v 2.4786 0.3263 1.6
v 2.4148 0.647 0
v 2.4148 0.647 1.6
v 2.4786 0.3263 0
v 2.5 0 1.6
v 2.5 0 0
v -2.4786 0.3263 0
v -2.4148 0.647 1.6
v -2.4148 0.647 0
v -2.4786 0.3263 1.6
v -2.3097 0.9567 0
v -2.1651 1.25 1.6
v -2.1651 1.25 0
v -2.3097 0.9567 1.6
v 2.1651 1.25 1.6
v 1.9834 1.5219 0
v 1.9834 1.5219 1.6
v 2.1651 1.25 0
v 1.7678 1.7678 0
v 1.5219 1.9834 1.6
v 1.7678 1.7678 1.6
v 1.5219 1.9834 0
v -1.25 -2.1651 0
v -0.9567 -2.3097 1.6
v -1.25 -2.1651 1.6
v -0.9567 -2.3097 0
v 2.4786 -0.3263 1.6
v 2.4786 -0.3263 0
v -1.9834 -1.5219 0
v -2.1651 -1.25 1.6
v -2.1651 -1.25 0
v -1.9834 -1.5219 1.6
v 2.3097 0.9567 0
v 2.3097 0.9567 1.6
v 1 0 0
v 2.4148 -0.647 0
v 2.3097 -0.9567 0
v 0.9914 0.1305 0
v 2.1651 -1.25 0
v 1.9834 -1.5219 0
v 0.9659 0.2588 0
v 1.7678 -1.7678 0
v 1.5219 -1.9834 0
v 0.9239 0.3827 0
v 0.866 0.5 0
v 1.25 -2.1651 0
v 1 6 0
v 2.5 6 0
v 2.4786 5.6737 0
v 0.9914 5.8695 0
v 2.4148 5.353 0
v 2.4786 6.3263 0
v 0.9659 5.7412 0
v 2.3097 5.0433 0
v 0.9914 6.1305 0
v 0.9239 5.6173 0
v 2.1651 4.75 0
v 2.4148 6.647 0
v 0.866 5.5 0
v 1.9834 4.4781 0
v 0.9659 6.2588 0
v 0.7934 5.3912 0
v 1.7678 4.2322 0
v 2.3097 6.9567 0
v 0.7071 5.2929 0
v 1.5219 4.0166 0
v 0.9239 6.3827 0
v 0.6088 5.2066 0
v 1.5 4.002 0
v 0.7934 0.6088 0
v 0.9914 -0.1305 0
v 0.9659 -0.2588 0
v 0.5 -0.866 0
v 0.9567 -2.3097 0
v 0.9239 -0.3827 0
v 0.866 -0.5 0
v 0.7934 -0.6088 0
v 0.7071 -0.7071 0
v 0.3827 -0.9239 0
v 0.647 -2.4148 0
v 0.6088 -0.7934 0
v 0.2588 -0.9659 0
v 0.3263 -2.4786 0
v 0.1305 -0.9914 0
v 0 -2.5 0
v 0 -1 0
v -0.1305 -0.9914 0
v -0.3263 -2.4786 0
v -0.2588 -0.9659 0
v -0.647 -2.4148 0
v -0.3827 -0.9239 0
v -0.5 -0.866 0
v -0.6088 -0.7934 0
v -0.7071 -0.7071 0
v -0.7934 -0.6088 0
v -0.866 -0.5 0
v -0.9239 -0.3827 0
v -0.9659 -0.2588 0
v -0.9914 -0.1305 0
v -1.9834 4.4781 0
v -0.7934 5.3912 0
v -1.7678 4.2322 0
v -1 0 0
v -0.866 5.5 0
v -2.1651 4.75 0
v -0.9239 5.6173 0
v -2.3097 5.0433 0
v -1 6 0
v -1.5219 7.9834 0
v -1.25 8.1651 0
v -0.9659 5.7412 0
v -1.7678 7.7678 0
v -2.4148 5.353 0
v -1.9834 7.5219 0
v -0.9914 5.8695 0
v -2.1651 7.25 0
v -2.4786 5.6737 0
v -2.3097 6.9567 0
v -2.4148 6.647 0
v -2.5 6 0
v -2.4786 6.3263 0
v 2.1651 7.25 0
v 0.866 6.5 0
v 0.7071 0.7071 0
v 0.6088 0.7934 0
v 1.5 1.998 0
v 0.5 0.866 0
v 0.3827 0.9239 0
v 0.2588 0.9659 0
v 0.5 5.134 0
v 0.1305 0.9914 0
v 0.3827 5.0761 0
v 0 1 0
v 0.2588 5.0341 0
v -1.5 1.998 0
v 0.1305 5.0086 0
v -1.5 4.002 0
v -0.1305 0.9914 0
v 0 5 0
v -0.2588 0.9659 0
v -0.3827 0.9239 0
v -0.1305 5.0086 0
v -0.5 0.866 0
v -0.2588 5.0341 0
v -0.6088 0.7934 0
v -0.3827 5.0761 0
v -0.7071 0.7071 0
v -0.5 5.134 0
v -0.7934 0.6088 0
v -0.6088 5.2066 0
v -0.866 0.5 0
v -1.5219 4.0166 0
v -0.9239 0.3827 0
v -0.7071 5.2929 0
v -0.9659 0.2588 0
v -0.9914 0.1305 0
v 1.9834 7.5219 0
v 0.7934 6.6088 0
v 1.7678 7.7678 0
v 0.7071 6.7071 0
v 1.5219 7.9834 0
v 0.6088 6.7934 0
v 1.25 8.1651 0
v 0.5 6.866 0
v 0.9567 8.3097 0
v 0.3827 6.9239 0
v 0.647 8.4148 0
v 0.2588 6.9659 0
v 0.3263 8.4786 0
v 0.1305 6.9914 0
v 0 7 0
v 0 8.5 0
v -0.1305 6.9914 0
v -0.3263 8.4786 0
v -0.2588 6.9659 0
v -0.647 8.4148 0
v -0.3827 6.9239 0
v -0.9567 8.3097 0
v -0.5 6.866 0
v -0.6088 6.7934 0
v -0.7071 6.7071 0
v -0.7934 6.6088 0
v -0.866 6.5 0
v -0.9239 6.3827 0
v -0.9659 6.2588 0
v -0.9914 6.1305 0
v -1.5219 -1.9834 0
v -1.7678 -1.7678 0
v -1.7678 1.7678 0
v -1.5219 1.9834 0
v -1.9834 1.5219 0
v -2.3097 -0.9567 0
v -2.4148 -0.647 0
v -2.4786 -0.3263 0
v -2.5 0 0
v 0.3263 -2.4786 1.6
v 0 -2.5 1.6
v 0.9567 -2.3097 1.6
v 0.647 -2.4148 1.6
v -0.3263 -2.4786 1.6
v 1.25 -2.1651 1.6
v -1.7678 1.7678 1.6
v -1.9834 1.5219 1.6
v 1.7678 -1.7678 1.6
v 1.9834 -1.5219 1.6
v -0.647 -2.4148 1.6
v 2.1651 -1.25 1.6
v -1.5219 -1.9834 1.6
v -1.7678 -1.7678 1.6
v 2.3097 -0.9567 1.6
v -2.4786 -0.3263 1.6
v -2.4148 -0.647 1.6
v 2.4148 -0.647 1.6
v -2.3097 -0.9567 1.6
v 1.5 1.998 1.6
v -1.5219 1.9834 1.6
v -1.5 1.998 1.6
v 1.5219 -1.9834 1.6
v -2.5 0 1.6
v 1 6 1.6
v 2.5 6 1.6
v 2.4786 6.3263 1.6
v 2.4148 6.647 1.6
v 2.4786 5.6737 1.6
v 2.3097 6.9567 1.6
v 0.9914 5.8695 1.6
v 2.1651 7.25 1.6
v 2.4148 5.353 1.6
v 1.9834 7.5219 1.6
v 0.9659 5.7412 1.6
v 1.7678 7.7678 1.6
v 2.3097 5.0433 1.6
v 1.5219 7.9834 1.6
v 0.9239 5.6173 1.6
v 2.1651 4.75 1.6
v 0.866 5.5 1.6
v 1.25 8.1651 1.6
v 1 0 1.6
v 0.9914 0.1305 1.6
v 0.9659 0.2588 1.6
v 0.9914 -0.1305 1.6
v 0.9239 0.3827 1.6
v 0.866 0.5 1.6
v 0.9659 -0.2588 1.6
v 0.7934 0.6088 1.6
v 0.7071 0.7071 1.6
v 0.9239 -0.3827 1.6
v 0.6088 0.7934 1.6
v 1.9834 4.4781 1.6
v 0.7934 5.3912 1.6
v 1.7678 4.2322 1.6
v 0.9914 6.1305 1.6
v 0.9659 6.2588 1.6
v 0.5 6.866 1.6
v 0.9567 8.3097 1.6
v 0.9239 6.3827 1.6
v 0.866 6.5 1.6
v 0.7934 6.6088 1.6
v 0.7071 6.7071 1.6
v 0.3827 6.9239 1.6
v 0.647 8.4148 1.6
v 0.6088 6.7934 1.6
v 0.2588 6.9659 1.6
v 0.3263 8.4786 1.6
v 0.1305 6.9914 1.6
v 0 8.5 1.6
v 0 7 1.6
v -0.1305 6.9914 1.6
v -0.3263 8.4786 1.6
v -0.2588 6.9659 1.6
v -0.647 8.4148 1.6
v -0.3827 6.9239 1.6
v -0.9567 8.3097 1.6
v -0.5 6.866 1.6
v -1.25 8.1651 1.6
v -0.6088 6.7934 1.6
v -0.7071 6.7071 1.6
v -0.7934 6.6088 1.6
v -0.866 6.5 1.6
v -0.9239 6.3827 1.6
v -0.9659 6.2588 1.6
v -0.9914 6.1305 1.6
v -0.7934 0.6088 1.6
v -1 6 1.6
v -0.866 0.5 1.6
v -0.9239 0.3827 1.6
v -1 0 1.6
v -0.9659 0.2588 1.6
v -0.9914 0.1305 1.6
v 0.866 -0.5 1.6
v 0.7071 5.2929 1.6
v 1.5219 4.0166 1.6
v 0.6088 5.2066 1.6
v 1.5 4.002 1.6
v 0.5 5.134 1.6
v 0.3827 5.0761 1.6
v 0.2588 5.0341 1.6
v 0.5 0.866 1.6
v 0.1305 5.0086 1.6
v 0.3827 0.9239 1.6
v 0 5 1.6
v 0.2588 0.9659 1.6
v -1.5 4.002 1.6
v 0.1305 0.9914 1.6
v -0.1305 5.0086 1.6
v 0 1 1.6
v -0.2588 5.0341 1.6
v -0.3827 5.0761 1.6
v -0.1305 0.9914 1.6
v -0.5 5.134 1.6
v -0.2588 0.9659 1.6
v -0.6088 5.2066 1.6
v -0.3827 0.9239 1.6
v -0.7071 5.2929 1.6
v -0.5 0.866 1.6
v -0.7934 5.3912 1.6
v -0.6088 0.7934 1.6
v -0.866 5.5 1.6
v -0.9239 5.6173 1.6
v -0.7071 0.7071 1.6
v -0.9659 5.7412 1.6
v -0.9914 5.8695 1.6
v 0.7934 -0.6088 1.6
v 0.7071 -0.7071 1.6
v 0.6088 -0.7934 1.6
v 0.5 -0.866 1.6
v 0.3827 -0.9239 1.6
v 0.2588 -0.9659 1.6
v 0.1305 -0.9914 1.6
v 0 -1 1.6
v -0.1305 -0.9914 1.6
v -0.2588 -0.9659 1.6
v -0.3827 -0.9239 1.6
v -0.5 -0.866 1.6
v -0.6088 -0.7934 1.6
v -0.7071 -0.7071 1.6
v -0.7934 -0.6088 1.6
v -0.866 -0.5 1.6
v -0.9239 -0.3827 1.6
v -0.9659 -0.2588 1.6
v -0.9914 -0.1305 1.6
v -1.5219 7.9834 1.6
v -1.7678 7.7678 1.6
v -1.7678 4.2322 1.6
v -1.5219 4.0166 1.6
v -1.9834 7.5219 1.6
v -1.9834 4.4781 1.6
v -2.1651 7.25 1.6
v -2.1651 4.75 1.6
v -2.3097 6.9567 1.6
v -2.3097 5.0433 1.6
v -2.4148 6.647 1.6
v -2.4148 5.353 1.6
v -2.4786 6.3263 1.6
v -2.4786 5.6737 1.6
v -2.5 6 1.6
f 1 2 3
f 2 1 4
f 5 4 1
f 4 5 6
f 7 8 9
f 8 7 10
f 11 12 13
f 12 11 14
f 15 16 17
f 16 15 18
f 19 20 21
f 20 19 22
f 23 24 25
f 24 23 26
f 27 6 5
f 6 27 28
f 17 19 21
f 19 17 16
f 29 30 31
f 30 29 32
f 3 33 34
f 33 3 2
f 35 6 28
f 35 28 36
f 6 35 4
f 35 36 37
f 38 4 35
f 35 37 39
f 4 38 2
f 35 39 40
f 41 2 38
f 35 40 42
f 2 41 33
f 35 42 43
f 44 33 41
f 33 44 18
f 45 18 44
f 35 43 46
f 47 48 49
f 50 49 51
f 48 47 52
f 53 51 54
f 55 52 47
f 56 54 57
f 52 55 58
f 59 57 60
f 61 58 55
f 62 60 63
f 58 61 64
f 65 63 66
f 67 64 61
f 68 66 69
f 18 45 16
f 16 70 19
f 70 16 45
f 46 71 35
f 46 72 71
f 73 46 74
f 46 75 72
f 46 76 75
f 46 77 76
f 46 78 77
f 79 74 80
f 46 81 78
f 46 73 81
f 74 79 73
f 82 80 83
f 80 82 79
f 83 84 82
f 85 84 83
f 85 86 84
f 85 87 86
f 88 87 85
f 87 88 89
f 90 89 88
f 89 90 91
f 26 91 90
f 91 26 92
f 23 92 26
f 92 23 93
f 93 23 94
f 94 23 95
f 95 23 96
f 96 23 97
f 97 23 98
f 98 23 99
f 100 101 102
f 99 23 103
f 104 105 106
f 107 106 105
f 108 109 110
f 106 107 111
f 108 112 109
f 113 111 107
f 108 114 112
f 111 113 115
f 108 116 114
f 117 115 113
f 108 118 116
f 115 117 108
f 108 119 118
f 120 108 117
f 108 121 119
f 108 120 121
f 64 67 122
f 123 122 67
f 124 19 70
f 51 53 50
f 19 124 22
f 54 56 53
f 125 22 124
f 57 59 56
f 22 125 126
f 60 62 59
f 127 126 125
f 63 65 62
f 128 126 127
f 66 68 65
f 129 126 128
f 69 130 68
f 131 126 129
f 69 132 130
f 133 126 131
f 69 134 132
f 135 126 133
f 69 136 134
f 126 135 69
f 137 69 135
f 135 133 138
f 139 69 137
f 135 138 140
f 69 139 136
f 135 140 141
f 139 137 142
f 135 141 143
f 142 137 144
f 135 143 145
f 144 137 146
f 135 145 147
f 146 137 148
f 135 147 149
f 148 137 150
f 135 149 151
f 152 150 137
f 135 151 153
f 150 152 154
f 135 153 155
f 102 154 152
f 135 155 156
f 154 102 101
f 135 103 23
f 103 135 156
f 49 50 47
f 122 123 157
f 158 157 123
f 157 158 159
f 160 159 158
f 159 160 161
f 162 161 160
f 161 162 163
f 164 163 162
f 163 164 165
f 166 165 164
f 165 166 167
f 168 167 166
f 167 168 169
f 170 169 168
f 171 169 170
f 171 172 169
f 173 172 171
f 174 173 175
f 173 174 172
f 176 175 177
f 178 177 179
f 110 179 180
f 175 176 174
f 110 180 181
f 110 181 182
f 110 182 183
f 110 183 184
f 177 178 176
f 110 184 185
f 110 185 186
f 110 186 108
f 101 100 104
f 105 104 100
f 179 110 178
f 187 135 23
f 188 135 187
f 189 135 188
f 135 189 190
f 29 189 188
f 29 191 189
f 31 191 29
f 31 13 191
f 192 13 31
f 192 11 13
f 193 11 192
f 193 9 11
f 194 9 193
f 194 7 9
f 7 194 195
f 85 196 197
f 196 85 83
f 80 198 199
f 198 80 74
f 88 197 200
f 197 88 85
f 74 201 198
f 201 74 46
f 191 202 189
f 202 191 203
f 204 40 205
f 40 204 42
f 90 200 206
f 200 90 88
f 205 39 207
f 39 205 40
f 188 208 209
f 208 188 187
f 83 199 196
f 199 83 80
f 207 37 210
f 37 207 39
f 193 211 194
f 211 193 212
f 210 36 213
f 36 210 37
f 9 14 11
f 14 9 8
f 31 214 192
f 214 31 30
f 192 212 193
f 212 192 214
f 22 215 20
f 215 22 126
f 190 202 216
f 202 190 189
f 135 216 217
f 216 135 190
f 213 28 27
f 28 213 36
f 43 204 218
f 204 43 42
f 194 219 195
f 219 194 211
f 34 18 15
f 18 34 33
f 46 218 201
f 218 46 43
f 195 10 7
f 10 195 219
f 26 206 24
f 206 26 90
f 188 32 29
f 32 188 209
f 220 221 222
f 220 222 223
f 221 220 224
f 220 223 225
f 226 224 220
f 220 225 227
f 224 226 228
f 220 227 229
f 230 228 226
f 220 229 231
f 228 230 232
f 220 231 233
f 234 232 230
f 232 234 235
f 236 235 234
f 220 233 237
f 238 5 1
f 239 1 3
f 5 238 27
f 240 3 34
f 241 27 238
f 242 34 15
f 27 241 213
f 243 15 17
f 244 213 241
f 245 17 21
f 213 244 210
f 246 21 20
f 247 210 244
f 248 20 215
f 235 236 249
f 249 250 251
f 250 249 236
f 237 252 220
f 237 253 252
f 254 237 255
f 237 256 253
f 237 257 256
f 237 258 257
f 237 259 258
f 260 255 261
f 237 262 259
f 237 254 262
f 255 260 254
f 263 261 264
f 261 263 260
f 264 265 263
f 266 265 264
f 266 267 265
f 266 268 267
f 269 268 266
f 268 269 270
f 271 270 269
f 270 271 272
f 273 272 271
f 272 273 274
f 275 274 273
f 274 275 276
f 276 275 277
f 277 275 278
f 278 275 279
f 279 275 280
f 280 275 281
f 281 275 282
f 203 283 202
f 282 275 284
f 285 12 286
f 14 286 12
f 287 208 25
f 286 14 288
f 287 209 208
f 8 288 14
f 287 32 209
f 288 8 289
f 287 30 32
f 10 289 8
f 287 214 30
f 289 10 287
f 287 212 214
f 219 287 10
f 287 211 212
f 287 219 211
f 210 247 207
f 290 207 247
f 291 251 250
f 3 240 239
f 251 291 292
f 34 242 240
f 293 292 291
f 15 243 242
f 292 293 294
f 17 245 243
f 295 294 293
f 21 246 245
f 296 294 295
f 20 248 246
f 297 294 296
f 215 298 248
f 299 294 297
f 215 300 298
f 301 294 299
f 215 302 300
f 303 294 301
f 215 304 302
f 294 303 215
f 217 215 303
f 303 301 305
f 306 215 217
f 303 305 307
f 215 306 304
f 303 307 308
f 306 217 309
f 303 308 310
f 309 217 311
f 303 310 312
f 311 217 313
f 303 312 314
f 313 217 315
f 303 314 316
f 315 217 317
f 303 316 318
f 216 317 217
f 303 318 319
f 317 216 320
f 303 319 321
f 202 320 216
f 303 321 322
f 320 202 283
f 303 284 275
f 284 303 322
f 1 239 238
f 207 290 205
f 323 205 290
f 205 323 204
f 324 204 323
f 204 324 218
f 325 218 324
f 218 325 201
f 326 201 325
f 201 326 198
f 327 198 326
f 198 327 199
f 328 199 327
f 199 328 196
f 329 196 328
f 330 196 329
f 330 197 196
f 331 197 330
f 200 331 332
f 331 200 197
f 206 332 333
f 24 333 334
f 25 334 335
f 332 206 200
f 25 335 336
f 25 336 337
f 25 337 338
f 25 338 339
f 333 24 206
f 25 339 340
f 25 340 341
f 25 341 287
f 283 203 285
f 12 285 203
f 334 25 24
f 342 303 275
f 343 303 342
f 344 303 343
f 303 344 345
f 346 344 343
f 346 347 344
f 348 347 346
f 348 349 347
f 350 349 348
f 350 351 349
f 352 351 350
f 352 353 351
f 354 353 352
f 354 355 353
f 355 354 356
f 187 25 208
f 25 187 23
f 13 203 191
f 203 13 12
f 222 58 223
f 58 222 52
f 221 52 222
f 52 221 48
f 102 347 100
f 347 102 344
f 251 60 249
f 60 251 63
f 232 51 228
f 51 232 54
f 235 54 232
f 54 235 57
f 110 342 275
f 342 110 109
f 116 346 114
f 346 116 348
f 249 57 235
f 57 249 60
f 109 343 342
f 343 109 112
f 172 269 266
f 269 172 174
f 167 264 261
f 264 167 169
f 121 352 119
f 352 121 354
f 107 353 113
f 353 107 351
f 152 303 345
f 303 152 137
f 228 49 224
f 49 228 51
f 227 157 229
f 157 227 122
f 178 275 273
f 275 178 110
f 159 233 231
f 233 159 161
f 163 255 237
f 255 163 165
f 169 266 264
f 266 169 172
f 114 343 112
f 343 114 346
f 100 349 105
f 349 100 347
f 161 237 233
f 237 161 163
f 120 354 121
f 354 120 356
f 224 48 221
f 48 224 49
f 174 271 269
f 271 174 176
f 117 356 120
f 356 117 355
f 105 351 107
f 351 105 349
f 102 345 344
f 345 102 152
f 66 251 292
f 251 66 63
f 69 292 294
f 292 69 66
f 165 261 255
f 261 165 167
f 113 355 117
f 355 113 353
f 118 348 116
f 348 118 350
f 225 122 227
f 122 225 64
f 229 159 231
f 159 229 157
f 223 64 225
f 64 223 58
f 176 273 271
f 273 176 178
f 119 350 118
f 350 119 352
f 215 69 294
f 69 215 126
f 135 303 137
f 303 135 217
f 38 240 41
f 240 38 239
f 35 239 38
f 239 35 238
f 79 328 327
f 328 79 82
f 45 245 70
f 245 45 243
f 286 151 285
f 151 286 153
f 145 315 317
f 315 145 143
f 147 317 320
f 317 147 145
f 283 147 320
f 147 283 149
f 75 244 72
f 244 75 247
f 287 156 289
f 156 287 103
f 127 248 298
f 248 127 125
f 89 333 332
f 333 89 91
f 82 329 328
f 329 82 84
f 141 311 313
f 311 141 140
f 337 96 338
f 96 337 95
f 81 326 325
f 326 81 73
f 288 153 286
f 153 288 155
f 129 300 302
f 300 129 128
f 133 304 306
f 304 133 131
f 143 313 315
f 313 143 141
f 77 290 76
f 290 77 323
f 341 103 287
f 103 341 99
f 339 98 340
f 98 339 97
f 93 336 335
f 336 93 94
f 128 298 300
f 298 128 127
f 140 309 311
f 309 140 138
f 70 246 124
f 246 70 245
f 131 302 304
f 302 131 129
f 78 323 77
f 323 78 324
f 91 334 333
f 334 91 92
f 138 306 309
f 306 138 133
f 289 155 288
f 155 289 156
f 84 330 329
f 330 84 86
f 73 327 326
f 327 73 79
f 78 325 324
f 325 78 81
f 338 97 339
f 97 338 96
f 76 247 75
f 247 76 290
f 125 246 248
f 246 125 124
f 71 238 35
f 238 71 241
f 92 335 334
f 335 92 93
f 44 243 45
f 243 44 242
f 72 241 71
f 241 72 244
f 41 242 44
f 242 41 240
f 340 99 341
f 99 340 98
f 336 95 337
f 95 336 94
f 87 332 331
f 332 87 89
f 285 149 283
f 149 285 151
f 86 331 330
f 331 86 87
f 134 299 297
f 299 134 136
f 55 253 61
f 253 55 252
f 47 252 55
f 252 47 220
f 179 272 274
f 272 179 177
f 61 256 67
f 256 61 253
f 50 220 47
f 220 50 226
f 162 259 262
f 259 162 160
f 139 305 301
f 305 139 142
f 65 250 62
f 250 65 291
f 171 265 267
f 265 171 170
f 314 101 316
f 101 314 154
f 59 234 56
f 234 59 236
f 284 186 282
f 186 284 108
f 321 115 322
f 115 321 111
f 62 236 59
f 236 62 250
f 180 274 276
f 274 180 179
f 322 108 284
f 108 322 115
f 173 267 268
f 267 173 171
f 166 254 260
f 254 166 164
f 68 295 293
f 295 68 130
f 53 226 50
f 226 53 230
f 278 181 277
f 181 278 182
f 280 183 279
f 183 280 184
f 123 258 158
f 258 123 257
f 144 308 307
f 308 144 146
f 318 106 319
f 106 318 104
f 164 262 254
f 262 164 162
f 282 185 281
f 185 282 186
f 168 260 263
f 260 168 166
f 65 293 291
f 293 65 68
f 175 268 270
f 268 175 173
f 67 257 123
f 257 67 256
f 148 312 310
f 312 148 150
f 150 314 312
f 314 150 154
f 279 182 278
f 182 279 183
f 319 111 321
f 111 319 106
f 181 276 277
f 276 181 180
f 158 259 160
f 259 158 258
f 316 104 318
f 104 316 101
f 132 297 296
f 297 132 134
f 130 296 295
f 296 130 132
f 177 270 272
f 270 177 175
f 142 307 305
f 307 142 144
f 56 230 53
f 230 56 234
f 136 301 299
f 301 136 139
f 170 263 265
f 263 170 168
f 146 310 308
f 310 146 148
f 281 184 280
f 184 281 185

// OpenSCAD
// P15 TPU side-ligament strap. TPU 95A, mm. Print flat, 100% infill.
// Test set: -D t=1.2 / 1.6 / 2.0. One peg on the joint pivot keeps the 6 mm span constant.
$fn=48;
t=1.6;
pitch=6.0;
peg_d=2.0;
eye_d=2.0;
ring_od=5.0;
web_w=3.0;
difference(){
  union(){
    for(y=[0,pitch]) translate([0,y,0]) cylinder(d=ring_od,h=t);
    translate([-web_w/2,0,0]) cube([web_w,pitch,t]);
  }
  for(y=[0,pitch]) translate([0,y,-1]) cylinder(d=eye_d,h=t+2);
}
